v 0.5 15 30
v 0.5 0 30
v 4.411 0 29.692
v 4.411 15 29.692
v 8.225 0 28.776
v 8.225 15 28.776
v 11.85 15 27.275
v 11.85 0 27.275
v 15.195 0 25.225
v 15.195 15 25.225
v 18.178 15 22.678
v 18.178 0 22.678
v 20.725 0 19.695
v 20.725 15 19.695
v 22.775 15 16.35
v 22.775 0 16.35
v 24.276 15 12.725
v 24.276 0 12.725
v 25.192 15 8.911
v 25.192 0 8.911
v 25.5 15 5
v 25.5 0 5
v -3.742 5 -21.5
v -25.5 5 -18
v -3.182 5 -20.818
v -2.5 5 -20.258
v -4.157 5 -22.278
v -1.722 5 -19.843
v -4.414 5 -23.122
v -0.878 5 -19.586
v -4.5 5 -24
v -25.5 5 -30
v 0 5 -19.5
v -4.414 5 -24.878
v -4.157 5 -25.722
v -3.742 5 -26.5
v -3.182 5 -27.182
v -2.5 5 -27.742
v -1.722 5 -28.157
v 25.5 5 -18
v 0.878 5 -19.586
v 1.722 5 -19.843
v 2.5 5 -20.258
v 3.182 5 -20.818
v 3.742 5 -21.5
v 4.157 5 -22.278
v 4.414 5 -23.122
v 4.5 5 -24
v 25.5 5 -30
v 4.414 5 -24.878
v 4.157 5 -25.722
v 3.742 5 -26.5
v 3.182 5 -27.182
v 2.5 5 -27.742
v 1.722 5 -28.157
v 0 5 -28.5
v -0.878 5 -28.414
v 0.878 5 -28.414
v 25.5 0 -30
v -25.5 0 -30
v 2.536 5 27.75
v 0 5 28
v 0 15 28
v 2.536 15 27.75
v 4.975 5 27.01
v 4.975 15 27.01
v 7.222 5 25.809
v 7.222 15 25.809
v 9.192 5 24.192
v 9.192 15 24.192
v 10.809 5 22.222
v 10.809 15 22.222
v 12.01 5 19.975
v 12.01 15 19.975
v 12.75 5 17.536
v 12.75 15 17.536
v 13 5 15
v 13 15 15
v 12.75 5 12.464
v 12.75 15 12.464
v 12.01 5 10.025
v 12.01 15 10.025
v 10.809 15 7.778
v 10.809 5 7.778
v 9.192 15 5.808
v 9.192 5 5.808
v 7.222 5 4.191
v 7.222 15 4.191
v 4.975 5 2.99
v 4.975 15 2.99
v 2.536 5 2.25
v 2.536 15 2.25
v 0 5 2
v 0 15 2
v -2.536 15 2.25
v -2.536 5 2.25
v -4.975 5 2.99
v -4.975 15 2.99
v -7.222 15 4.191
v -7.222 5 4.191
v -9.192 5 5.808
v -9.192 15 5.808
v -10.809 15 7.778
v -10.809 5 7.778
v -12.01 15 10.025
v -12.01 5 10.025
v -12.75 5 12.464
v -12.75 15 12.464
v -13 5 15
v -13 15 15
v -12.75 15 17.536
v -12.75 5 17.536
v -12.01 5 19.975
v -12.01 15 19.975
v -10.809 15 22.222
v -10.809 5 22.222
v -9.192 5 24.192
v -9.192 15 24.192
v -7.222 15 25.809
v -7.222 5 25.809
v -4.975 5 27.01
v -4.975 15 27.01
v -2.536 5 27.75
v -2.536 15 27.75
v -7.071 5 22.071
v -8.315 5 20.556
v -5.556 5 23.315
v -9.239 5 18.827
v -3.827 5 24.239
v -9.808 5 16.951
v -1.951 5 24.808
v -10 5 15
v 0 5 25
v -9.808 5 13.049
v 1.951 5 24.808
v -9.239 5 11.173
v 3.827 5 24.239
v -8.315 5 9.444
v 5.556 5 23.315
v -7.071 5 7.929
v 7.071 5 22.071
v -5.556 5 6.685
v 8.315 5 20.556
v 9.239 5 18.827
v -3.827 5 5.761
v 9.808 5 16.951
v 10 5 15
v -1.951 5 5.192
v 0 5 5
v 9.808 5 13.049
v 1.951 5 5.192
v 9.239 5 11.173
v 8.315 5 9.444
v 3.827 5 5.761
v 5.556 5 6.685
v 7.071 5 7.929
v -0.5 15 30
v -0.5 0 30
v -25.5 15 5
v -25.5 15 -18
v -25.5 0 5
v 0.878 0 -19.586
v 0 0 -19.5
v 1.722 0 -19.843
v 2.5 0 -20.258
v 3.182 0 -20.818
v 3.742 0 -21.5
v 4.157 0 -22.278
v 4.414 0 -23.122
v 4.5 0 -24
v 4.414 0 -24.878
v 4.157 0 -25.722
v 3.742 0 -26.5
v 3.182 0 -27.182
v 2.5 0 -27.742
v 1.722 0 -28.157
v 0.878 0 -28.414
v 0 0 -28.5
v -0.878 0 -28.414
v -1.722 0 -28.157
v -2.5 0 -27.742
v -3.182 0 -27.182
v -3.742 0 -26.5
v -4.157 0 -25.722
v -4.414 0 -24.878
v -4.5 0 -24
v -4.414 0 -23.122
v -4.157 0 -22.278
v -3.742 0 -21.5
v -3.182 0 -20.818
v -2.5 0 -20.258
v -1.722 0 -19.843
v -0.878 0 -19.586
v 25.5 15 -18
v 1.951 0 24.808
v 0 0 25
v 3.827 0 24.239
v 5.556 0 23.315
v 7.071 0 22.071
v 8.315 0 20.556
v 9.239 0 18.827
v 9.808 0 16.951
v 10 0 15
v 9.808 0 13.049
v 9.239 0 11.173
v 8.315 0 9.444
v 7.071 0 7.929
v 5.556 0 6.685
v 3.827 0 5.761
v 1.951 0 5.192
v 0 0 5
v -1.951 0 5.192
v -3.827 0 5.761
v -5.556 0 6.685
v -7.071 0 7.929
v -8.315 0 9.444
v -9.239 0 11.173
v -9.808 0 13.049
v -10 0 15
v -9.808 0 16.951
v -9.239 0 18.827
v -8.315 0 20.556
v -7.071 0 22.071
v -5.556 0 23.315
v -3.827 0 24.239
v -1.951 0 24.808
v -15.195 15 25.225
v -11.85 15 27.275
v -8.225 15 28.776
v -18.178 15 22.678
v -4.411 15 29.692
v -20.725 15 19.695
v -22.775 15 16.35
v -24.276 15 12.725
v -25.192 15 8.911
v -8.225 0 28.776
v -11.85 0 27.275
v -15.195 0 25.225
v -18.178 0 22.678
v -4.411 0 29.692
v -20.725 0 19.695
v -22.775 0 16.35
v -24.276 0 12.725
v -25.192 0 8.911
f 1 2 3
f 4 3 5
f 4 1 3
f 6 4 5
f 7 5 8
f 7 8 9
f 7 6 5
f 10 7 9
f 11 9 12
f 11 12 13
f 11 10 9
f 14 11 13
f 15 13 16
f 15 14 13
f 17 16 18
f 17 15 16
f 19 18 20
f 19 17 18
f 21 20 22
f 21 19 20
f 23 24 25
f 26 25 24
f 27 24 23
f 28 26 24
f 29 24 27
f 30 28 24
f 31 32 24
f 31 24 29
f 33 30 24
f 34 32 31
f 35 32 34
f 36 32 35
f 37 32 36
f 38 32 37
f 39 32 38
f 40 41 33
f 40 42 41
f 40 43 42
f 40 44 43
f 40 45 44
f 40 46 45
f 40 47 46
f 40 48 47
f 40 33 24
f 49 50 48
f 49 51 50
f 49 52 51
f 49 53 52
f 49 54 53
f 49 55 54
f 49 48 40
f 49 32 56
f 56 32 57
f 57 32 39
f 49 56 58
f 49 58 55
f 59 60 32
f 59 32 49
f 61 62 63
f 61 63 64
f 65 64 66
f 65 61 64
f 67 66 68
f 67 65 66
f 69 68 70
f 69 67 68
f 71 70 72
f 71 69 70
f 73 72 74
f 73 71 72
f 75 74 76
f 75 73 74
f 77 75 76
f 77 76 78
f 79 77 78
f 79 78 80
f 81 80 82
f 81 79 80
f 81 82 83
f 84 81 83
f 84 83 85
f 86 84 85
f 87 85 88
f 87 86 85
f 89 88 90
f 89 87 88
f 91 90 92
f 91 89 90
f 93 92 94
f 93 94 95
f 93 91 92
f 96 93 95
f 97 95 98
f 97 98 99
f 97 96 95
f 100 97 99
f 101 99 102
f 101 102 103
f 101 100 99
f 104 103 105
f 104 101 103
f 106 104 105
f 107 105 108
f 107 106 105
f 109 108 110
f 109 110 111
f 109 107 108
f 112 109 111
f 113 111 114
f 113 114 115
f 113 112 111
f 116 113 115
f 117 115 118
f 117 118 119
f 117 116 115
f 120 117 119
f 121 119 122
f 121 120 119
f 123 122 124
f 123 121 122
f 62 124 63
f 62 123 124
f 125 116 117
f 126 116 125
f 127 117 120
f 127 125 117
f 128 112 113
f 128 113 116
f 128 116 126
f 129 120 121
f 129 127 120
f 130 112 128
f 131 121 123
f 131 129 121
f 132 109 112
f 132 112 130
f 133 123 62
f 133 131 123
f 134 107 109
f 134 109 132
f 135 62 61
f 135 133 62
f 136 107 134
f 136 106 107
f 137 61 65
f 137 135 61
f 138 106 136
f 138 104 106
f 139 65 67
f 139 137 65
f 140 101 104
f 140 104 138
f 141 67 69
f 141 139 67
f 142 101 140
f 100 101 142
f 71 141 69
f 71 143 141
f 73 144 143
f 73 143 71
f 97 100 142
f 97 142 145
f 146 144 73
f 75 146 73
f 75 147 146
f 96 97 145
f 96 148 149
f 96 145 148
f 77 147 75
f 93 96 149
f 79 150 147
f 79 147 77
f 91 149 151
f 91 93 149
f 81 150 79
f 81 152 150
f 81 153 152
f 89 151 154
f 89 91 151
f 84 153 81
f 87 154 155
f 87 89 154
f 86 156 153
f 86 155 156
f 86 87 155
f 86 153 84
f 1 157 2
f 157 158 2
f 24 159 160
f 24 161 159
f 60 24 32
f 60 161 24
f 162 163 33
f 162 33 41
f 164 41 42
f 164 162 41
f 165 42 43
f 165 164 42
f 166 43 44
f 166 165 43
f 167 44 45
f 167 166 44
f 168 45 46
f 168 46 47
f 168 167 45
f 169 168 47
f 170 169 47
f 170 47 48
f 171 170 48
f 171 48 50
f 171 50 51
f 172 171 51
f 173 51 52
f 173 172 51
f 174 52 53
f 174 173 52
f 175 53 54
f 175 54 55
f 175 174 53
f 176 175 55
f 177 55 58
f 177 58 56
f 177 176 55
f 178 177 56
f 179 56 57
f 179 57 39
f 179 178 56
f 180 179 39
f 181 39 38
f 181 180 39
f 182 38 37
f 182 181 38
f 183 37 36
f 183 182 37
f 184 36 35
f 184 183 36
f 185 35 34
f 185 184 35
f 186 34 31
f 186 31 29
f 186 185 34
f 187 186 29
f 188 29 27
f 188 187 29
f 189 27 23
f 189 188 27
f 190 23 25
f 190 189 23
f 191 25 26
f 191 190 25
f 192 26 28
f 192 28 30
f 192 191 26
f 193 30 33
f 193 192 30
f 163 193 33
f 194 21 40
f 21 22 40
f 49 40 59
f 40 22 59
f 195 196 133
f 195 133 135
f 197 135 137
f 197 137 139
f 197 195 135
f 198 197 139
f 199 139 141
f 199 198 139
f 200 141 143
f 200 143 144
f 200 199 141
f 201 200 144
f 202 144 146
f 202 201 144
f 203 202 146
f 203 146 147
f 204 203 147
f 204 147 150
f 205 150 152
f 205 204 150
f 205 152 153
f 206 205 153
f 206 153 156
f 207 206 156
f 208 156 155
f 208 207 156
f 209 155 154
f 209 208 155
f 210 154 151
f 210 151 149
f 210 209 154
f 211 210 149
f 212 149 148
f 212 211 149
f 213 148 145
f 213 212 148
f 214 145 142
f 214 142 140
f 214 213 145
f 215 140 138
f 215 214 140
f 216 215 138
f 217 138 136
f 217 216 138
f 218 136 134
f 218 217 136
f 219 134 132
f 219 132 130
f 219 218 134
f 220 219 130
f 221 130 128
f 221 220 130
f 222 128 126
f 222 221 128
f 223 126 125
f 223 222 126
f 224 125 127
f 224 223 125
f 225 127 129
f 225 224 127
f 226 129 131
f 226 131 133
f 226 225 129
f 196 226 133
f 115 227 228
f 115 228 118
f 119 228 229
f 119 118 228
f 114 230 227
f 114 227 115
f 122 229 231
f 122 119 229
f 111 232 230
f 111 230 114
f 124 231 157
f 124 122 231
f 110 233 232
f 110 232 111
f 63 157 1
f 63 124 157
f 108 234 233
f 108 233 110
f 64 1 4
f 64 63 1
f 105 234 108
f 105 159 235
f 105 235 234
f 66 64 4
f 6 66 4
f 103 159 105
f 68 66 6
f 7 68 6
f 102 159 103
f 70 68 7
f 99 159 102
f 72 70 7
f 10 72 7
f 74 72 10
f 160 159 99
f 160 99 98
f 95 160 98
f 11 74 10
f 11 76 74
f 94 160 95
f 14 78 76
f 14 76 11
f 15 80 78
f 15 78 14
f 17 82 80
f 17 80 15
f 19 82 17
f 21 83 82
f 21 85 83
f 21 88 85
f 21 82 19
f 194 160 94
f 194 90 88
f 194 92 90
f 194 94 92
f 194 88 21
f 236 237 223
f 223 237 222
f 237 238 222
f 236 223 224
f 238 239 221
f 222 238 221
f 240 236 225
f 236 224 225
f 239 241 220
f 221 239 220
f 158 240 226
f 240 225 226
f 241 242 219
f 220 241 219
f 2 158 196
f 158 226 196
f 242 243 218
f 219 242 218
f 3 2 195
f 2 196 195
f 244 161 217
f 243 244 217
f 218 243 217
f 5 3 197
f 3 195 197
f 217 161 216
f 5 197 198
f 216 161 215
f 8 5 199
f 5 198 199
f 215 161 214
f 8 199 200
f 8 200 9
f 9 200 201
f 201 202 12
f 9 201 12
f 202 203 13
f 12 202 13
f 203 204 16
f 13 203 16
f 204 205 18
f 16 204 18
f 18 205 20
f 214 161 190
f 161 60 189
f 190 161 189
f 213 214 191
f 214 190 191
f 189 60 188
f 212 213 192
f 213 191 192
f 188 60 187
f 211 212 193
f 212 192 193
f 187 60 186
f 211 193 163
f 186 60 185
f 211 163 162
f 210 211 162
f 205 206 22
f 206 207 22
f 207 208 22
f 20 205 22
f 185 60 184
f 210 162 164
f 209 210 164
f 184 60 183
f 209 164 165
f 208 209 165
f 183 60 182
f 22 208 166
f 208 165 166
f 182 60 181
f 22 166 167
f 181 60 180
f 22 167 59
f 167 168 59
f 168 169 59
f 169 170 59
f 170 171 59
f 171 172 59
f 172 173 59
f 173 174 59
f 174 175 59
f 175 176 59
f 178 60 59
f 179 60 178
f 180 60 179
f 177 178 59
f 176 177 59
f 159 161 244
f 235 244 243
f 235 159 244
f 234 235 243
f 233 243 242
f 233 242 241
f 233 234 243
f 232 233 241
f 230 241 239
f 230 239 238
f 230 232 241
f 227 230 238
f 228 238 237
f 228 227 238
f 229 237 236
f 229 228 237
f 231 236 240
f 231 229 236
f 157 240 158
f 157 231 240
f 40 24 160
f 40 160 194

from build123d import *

# Parameters (mm, degrees)
SZKIC1_W                    = 51
SZKIC1_H                    = 60
SZKIC1_R                    = 4.5
SZKIC1_R_2                  = 10
DODANIE_WYCI_GNI_CIE1_DEPTH = 5
DODANIE_WYCI_GNI_CIE2_START = 5
SZKIC2_W                    = 51
SZKIC2_H                    = 48
SZKIC2_R                    = 13
DODANIE_WYCI_GNI_CIE2_DEPTH = 10
ZAOKR_GLENIE1_R             = 25


with BuildPart() as part:
    # Szkic1 → Dodanie-wyciągnięcie1 (new body)
    with BuildSketch(Plane(origin=(0, 0, 0), x_dir=(1, 0, 0), z_dir=(0, 1, 0))):
        Rectangle(SZKIC1_W, SZKIC1_H)
        with Locations(Location((0, 24, 0), (0, 0, 270))):
            Circle(SZKIC1_R, mode=Mode.SUBTRACT)
        with Locations(Location((0, -15, 0), (0, 0, 270))):
            Circle(SZKIC1_R_2, mode=Mode.SUBTRACT)
    extrude(amount=DODANIE_WYCI_GNI_CIE1_DEPTH)

    # Szkic2 → Dodanie-wyciągnięcie2 (add)
    with BuildSketch(Plane(origin=(0, 0, 0), x_dir=(1, 0, 0), z_dir=(0, 1, 0)).offset(DODANIE_WYCI_GNI_CIE2_START)):
        with Locations((0, -6)):
            Rectangle(SZKIC2_W, SZKIC2_H)
        with Locations(Location((0, -15, 0), (0, 0, 270))):
            Circle(SZKIC2_R, mode=Mode.SUBTRACT)
    extrude(amount=DODANIE_WYCI_GNI_CIE2_DEPTH)

    # Zaokrąglenie1
    zaokr_glenie1_edges = [part.edges().sort_by_distance(p)[0] for p in [
        (25.5, 7.5, 30),
        (-25.5, 7.5, 30),
    ]]
    fillet(zaokr_glenie1_edges, radius=ZAOKR_GLENIE1_R)


solid = part.part
